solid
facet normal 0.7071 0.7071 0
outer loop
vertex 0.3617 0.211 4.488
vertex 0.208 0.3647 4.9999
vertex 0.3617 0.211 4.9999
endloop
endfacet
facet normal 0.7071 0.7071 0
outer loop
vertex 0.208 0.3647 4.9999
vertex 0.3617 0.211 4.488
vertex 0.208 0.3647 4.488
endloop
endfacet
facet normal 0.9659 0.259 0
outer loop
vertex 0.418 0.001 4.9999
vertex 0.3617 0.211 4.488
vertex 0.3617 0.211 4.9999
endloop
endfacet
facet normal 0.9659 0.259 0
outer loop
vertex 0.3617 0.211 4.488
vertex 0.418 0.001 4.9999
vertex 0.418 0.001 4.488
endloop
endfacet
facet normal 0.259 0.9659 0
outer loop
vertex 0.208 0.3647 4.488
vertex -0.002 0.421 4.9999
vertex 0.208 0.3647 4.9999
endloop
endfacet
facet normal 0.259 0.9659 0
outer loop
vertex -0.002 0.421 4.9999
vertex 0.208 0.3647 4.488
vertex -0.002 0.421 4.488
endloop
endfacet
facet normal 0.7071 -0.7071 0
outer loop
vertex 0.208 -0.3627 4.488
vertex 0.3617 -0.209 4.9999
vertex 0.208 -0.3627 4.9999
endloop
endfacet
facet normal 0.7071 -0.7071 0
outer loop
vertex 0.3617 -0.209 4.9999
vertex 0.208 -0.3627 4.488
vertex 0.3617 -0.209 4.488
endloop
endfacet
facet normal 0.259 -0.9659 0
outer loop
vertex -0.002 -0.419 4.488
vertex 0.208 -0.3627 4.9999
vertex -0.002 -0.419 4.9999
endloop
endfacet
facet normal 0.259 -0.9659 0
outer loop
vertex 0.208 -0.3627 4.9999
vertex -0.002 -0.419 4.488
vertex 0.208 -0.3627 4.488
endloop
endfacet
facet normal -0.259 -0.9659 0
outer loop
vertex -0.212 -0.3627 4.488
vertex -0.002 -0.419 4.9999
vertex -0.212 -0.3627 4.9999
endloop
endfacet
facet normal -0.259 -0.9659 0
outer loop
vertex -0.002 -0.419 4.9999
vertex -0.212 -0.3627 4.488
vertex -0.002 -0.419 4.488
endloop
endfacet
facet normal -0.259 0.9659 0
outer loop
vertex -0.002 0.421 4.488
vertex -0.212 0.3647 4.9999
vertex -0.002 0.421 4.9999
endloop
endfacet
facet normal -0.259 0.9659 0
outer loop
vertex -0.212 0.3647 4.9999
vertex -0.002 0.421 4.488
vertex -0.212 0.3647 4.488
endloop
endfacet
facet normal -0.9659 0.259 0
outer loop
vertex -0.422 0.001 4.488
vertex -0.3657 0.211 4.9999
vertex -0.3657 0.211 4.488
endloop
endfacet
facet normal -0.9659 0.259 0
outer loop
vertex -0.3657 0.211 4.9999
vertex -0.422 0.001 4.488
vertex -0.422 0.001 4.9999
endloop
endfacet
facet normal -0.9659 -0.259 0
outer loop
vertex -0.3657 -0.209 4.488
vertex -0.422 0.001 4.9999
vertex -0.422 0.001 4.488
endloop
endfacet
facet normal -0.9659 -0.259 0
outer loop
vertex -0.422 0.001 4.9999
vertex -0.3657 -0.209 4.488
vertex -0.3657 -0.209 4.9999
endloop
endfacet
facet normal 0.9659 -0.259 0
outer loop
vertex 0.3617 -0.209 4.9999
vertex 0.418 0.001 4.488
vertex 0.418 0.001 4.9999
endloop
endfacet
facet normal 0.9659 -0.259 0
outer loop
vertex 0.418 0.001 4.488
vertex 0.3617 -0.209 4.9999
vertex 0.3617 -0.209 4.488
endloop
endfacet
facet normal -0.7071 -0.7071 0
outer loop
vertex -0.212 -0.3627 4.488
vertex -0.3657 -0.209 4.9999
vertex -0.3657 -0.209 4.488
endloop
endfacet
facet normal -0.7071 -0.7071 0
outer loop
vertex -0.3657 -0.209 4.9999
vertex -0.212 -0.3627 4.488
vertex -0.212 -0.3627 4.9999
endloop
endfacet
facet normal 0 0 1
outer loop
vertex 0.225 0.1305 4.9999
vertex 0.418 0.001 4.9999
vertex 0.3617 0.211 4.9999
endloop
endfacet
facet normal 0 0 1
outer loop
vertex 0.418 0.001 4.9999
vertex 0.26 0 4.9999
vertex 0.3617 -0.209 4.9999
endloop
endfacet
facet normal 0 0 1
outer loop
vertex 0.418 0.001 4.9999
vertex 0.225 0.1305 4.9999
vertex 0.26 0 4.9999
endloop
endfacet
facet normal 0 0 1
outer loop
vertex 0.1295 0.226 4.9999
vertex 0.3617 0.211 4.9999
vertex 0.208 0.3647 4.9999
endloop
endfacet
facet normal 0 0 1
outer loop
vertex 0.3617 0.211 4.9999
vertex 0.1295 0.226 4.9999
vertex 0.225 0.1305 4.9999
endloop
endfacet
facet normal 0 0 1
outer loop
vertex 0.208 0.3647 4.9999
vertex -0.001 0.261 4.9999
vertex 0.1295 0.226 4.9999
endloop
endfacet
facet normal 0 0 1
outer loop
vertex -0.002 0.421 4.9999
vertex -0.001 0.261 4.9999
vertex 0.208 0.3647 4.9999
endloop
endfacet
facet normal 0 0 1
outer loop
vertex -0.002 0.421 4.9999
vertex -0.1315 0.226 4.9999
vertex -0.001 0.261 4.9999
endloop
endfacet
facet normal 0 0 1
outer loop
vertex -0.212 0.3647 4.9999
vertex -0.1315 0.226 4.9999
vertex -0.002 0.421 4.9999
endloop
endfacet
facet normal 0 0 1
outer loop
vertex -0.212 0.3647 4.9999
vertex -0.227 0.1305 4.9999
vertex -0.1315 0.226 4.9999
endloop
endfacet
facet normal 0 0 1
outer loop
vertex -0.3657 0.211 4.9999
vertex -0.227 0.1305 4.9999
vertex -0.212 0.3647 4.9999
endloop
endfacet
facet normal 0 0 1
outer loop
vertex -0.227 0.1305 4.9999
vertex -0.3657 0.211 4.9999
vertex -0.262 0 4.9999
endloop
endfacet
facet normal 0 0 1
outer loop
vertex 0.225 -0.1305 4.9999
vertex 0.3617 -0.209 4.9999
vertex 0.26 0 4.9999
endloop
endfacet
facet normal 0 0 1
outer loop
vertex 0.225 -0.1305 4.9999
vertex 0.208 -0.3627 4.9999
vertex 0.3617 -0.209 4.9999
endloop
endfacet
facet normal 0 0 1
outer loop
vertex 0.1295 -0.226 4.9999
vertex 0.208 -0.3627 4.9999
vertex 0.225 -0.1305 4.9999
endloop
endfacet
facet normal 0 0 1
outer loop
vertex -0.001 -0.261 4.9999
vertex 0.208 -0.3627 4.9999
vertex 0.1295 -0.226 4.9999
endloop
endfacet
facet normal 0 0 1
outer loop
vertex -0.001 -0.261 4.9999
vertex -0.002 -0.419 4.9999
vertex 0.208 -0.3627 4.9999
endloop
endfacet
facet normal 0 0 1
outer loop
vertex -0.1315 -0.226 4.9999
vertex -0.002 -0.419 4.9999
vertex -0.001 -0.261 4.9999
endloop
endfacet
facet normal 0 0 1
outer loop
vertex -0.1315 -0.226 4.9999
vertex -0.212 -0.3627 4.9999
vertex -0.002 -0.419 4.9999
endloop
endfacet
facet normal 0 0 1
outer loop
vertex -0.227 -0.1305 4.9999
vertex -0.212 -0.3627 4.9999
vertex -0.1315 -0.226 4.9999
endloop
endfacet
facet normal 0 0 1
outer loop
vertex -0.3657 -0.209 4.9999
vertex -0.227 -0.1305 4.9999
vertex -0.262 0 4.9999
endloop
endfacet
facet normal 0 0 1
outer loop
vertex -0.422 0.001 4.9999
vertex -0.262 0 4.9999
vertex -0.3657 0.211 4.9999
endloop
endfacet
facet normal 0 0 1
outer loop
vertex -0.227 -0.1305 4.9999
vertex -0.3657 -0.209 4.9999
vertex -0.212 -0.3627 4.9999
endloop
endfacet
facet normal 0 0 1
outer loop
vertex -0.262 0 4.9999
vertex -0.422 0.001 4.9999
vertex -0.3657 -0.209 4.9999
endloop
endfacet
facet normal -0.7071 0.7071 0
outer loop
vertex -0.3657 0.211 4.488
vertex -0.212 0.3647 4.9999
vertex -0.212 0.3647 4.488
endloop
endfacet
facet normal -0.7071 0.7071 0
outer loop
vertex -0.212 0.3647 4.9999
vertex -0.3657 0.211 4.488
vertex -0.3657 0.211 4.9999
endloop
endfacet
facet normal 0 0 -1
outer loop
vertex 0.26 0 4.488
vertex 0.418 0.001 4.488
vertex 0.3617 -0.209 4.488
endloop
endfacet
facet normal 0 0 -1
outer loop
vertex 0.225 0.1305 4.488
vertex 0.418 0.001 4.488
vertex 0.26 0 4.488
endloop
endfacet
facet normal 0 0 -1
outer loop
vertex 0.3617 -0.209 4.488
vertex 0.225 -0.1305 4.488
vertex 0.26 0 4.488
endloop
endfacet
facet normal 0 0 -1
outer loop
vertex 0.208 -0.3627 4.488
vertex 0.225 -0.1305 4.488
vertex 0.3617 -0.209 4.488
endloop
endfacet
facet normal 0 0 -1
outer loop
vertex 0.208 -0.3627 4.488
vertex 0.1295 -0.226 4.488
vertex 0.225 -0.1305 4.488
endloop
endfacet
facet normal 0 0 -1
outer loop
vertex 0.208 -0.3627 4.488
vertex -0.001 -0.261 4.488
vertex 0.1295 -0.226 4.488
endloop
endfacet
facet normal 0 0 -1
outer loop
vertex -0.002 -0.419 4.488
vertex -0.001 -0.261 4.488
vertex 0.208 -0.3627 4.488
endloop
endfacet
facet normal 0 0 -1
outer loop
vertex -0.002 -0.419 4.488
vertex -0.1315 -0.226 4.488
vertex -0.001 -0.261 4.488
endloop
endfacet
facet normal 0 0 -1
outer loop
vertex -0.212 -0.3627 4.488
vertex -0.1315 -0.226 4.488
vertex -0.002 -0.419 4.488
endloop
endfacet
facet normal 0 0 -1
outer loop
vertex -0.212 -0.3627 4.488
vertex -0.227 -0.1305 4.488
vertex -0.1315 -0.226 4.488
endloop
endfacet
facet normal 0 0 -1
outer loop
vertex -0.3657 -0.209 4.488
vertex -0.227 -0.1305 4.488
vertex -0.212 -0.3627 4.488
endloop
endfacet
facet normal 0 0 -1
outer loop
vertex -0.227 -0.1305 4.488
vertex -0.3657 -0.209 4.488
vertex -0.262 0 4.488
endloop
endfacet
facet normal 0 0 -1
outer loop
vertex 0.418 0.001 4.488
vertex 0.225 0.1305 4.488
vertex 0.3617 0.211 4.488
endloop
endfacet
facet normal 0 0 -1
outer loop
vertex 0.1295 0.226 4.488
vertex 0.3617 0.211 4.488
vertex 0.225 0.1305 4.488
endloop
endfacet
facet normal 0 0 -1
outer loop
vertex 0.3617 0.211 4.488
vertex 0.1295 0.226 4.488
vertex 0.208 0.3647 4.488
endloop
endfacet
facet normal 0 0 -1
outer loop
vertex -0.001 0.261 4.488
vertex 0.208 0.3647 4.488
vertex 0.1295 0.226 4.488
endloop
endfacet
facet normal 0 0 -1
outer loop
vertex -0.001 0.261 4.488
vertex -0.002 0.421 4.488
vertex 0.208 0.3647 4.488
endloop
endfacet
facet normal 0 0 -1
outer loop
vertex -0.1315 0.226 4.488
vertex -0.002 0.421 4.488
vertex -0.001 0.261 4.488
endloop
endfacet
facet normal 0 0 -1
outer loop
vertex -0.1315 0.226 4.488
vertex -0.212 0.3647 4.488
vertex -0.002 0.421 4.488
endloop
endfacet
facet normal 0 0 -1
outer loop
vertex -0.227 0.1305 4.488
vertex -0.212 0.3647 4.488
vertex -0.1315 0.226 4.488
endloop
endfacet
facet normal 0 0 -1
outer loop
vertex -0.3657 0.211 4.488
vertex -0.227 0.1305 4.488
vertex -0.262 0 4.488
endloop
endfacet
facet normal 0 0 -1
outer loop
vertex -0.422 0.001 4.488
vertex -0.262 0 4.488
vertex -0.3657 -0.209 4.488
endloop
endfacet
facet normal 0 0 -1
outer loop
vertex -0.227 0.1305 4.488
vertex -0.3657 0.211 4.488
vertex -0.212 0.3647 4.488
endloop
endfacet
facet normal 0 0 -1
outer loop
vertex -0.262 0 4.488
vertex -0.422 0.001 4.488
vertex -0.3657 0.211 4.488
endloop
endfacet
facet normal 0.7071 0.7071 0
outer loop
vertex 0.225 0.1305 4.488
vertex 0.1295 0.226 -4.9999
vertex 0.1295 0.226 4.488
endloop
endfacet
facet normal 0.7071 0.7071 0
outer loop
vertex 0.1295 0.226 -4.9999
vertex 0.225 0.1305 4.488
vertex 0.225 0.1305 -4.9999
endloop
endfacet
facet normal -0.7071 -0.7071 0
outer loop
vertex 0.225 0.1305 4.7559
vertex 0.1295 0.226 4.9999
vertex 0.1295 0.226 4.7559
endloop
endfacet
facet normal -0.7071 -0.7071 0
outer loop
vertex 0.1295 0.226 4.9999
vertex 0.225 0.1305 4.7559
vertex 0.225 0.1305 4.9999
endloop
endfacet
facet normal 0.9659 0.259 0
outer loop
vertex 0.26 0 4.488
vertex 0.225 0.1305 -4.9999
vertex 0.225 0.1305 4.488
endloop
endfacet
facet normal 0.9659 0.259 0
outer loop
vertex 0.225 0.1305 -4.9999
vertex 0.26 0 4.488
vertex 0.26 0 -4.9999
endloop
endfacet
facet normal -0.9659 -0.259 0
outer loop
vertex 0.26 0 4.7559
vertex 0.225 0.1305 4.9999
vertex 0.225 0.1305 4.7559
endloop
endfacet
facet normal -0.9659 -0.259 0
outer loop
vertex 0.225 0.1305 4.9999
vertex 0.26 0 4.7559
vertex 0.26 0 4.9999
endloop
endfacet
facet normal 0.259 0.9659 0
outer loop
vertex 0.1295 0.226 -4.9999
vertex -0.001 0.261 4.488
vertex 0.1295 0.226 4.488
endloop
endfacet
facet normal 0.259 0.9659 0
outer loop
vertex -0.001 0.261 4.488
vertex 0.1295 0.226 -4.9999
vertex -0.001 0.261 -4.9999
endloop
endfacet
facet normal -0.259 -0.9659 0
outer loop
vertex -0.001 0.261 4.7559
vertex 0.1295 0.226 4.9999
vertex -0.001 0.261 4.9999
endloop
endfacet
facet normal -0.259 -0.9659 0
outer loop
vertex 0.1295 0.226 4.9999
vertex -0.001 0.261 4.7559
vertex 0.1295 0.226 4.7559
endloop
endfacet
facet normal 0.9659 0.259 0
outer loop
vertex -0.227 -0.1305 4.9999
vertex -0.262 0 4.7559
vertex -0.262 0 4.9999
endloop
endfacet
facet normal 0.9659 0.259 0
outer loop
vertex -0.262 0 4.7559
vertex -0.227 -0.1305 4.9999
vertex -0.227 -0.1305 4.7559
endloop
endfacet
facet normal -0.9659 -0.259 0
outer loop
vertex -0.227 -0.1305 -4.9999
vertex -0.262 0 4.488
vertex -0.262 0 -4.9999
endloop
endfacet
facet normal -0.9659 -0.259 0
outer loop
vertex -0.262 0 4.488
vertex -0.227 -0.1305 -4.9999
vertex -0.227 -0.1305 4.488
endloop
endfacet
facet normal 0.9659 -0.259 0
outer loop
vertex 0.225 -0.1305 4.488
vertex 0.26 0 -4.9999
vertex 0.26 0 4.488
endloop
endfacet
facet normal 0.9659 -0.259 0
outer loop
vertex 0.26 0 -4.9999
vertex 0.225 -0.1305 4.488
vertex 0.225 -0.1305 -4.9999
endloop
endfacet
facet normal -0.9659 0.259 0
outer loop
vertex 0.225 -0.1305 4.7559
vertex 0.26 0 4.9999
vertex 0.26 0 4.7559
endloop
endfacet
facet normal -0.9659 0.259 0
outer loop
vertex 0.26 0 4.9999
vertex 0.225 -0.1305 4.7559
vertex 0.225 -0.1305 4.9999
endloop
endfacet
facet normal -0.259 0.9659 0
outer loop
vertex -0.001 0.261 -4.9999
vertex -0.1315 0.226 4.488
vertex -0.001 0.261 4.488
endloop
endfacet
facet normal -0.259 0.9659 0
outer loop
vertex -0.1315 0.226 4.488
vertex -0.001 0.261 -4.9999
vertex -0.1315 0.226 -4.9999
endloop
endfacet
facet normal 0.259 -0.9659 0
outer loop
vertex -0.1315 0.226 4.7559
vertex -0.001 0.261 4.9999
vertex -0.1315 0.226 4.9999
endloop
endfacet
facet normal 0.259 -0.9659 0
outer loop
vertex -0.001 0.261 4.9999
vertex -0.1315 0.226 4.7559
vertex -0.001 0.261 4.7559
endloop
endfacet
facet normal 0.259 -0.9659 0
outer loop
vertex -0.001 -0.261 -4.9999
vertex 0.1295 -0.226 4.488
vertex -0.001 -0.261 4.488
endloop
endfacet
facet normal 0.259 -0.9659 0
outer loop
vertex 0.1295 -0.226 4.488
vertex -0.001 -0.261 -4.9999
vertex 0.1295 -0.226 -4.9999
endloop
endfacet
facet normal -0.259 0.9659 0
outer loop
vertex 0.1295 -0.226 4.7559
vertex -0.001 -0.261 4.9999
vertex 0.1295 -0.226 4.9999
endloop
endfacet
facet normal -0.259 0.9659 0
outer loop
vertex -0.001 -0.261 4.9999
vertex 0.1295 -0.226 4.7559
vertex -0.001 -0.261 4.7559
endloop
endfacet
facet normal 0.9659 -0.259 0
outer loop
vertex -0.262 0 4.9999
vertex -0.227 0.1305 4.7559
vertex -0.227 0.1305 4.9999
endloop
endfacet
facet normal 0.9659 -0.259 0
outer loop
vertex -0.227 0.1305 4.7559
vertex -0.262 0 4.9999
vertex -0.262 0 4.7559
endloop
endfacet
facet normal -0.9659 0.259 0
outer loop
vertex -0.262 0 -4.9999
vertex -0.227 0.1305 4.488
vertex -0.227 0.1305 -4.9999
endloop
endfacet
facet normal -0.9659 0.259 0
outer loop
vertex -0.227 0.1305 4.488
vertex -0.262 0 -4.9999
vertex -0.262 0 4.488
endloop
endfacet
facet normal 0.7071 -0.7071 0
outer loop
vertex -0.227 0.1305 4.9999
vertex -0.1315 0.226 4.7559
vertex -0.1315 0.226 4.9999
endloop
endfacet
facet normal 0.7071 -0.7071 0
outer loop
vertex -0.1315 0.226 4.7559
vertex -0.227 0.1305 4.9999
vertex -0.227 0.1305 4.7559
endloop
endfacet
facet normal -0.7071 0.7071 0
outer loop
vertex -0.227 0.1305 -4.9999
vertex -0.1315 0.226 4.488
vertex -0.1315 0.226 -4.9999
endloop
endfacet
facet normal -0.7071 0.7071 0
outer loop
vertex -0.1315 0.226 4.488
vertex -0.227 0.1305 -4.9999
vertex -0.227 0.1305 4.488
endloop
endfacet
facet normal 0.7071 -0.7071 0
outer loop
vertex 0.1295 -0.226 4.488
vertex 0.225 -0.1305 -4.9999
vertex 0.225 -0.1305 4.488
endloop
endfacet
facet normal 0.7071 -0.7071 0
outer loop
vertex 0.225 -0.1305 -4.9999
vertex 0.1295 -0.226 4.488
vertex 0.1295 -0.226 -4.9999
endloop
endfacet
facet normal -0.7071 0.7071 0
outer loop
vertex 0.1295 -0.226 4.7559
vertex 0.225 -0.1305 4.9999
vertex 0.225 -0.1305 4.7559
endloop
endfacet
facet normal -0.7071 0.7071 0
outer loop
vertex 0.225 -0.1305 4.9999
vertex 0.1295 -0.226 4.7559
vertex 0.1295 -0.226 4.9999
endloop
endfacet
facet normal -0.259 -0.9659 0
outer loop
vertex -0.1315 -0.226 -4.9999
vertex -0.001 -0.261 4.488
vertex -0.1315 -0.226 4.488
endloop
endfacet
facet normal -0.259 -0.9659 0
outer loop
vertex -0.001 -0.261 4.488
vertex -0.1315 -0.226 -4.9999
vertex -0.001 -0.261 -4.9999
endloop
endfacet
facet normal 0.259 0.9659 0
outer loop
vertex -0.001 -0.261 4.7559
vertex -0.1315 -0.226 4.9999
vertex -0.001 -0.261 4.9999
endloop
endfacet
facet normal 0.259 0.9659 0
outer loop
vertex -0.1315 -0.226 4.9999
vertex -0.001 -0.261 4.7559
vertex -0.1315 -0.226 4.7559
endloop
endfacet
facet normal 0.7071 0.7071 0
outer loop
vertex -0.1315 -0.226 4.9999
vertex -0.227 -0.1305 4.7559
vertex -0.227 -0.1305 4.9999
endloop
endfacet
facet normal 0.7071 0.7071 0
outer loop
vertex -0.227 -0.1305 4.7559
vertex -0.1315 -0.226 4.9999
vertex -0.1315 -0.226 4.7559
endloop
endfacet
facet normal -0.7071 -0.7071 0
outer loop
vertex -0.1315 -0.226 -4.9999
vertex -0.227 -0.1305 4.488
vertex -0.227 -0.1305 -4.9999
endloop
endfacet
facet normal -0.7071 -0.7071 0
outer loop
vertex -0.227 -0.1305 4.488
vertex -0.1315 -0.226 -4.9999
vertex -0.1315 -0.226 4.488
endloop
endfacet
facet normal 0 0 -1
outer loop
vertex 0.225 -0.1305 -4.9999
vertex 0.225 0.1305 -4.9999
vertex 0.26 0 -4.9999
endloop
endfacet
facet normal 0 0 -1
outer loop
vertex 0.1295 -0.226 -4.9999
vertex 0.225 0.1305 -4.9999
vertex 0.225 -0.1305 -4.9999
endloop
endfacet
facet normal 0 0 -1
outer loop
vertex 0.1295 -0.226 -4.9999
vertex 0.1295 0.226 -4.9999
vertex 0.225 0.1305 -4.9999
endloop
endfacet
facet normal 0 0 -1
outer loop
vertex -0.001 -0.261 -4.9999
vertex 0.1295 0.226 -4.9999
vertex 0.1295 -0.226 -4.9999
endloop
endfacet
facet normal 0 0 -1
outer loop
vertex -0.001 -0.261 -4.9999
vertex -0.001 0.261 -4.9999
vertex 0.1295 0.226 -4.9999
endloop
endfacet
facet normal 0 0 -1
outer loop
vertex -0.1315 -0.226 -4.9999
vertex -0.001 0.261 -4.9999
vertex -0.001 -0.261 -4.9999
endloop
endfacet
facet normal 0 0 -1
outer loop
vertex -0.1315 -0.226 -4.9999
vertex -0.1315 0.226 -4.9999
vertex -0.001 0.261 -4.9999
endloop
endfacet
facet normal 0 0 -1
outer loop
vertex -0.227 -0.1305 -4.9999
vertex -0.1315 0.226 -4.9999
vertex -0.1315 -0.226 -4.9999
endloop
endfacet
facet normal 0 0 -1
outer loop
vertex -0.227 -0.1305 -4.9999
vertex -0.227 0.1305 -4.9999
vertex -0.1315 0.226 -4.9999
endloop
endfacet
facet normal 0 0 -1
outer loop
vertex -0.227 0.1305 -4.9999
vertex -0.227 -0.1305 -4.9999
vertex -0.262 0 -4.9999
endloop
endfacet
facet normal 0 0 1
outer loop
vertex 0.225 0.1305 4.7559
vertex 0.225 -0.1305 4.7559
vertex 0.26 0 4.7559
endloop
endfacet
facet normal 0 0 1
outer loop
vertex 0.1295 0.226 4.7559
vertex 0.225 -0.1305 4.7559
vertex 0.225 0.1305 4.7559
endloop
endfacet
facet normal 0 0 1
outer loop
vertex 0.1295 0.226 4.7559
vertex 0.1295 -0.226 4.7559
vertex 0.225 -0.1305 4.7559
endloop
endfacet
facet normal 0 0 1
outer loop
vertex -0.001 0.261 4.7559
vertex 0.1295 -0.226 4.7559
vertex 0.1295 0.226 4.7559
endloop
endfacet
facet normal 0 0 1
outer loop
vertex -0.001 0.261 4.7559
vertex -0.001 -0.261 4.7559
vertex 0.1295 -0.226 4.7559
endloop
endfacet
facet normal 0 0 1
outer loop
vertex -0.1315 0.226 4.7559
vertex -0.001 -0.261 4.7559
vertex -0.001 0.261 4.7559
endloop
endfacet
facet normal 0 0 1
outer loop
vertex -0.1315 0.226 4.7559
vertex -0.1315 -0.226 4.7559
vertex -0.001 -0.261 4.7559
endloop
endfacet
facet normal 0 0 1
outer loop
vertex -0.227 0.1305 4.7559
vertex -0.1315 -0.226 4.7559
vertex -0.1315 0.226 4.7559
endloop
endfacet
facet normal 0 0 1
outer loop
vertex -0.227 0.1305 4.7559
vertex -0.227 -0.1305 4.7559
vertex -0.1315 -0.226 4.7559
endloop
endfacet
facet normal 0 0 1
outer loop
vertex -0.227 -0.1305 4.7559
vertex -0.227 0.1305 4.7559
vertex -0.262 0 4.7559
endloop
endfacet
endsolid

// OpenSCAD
intersection() {
  translate([0, 0.0005, 0])
  cube(size = [1.0079, 1.0089, 11.9999], center = true);

  union() {
    difference() {
      translate([-0.002, 0.001, 4.744])
      cylinder(h = 0.5119, r1 = 0.42, r2 = 0.42, center = true, $fn = 12);
    
      translate([-0.001, 0, 0])
      cylinder(h = 36.2, r1 = 0.261, r2 = 0.261, center = true, $fn = 12);
    }
  
    translate([-0.001, 0, -0.122])
    cylinder(h = 9.7559, r1 = 0.261, r2 = 0.261, center = true, $fn = 12);
  }
}
